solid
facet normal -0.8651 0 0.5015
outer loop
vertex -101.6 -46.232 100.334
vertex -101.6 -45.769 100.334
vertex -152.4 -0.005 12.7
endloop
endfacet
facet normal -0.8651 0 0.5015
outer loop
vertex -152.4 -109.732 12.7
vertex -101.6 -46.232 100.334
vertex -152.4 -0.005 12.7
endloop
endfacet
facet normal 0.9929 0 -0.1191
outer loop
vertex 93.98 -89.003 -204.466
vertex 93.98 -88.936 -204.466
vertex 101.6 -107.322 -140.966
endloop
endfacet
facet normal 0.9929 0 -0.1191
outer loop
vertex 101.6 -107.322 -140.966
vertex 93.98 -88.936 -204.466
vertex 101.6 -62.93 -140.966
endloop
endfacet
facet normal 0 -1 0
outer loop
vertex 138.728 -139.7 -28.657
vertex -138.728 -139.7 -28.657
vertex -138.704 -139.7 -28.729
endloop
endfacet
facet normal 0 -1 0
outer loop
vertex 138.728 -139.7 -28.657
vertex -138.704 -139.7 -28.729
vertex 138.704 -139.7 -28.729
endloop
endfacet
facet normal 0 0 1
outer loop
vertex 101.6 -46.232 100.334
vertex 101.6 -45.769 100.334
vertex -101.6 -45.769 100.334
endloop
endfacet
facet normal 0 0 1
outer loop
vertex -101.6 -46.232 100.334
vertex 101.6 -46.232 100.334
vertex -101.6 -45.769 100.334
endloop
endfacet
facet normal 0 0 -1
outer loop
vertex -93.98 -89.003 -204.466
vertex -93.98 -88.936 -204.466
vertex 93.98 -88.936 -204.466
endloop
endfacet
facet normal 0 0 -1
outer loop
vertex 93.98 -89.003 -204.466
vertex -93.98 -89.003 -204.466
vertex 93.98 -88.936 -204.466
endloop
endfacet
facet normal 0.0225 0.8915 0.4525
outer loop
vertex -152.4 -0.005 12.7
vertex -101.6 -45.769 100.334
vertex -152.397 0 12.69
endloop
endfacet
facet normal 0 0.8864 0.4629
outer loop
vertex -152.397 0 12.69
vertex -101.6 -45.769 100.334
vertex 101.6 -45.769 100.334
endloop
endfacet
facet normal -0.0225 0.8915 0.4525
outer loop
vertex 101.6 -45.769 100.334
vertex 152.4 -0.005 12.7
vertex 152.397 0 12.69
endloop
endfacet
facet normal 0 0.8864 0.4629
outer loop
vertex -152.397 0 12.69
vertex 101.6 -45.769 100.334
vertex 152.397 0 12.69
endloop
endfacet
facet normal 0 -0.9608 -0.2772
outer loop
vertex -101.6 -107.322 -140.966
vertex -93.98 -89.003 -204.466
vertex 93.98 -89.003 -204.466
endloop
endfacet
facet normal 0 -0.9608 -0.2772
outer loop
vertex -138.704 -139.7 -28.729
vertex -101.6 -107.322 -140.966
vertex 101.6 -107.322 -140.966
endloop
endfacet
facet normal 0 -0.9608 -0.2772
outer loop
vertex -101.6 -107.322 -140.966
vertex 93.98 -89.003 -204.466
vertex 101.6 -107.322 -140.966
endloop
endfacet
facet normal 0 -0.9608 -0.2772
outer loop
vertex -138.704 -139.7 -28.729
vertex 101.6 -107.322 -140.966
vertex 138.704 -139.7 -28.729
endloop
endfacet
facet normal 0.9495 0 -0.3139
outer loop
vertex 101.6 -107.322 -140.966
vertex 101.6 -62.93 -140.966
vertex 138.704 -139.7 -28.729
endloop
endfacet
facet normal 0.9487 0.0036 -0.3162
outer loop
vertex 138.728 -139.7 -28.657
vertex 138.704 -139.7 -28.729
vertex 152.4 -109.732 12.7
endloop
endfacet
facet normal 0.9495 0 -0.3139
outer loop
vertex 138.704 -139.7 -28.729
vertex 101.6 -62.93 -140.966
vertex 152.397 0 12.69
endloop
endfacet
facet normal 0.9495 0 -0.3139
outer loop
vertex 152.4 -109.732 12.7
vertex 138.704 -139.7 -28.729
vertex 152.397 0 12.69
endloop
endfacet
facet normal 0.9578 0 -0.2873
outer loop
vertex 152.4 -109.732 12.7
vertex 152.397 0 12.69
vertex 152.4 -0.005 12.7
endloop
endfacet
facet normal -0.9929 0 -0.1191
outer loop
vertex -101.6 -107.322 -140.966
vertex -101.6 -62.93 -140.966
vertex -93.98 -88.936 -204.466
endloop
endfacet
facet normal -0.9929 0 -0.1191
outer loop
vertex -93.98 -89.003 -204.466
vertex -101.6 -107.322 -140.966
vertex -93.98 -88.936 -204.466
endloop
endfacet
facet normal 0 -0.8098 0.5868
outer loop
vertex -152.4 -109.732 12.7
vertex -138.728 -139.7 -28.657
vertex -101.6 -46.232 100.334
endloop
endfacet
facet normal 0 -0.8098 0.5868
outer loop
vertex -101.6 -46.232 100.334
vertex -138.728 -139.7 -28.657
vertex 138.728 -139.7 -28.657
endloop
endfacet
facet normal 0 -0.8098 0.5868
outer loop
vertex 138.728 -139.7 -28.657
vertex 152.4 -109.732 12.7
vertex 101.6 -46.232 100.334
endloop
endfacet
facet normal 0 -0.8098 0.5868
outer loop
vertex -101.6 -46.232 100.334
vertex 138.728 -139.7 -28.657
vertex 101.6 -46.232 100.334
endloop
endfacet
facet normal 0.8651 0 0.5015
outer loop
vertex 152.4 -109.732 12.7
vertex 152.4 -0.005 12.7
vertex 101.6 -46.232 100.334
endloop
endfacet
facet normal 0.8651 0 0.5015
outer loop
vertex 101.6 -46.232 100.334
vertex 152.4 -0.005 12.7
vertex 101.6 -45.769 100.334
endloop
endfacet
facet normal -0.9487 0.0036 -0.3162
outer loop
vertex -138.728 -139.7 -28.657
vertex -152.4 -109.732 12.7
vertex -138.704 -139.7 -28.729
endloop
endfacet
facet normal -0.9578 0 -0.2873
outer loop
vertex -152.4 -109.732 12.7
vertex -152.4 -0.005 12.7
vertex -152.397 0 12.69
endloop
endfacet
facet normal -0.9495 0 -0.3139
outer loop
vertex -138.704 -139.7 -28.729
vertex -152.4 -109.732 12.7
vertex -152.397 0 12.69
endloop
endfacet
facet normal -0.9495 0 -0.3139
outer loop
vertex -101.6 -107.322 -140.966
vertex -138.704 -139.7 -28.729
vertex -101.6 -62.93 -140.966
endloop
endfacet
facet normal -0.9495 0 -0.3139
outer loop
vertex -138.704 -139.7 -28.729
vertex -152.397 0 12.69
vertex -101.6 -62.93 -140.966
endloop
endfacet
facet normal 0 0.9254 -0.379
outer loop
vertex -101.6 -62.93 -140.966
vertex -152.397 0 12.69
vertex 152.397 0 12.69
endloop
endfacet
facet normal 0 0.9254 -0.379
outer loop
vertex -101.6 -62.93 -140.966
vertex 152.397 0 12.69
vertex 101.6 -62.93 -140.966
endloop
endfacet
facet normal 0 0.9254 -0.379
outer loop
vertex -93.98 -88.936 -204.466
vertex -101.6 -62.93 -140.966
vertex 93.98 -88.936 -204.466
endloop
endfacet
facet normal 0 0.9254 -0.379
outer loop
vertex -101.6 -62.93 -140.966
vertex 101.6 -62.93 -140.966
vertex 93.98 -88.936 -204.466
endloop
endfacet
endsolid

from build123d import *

# Parameters (mm, degrees)
F1_DEPTH = 139.7
F3_DEPTH = 254


with BuildPart() as f1:
    # F0 (on Front) → F1 (new body)
    with BuildSketch(Plane.XZ):
        Polygon((-101.6, 100.334205), (-152.4, 12.7), (-101.6, -140.965795), (-93.98, -204.465795), (0, -204.465795), (0, 100.334205), align=None)
        Polygon((101.6, 100.334205), (0, 100.334205), (0, -204.465795), (93.98, -204.465795), (101.6, -140.965795), (152.4, 12.7), align=None)
    extrude(amount=F1_DEPTH)

    # F2 (on Right) → F3 (cut, symmetric)
    with BuildSketch(Plane.YZ):
        Polygon((11.297926, 100.633033), (-45.92489, 100.633033), (0, 12.690174), (-88.975355, -204.561785), (-139.714777, -28.677866), (-46.015032, 100.633033), (-152.156293, 100.633033), (-152.156293, -218.677998), (11.297926, -218.677998), align=None)
    extrude(amount=F3_DEPTH, both=True, mode=Mode.SUBTRACT)


solid = f1.part
